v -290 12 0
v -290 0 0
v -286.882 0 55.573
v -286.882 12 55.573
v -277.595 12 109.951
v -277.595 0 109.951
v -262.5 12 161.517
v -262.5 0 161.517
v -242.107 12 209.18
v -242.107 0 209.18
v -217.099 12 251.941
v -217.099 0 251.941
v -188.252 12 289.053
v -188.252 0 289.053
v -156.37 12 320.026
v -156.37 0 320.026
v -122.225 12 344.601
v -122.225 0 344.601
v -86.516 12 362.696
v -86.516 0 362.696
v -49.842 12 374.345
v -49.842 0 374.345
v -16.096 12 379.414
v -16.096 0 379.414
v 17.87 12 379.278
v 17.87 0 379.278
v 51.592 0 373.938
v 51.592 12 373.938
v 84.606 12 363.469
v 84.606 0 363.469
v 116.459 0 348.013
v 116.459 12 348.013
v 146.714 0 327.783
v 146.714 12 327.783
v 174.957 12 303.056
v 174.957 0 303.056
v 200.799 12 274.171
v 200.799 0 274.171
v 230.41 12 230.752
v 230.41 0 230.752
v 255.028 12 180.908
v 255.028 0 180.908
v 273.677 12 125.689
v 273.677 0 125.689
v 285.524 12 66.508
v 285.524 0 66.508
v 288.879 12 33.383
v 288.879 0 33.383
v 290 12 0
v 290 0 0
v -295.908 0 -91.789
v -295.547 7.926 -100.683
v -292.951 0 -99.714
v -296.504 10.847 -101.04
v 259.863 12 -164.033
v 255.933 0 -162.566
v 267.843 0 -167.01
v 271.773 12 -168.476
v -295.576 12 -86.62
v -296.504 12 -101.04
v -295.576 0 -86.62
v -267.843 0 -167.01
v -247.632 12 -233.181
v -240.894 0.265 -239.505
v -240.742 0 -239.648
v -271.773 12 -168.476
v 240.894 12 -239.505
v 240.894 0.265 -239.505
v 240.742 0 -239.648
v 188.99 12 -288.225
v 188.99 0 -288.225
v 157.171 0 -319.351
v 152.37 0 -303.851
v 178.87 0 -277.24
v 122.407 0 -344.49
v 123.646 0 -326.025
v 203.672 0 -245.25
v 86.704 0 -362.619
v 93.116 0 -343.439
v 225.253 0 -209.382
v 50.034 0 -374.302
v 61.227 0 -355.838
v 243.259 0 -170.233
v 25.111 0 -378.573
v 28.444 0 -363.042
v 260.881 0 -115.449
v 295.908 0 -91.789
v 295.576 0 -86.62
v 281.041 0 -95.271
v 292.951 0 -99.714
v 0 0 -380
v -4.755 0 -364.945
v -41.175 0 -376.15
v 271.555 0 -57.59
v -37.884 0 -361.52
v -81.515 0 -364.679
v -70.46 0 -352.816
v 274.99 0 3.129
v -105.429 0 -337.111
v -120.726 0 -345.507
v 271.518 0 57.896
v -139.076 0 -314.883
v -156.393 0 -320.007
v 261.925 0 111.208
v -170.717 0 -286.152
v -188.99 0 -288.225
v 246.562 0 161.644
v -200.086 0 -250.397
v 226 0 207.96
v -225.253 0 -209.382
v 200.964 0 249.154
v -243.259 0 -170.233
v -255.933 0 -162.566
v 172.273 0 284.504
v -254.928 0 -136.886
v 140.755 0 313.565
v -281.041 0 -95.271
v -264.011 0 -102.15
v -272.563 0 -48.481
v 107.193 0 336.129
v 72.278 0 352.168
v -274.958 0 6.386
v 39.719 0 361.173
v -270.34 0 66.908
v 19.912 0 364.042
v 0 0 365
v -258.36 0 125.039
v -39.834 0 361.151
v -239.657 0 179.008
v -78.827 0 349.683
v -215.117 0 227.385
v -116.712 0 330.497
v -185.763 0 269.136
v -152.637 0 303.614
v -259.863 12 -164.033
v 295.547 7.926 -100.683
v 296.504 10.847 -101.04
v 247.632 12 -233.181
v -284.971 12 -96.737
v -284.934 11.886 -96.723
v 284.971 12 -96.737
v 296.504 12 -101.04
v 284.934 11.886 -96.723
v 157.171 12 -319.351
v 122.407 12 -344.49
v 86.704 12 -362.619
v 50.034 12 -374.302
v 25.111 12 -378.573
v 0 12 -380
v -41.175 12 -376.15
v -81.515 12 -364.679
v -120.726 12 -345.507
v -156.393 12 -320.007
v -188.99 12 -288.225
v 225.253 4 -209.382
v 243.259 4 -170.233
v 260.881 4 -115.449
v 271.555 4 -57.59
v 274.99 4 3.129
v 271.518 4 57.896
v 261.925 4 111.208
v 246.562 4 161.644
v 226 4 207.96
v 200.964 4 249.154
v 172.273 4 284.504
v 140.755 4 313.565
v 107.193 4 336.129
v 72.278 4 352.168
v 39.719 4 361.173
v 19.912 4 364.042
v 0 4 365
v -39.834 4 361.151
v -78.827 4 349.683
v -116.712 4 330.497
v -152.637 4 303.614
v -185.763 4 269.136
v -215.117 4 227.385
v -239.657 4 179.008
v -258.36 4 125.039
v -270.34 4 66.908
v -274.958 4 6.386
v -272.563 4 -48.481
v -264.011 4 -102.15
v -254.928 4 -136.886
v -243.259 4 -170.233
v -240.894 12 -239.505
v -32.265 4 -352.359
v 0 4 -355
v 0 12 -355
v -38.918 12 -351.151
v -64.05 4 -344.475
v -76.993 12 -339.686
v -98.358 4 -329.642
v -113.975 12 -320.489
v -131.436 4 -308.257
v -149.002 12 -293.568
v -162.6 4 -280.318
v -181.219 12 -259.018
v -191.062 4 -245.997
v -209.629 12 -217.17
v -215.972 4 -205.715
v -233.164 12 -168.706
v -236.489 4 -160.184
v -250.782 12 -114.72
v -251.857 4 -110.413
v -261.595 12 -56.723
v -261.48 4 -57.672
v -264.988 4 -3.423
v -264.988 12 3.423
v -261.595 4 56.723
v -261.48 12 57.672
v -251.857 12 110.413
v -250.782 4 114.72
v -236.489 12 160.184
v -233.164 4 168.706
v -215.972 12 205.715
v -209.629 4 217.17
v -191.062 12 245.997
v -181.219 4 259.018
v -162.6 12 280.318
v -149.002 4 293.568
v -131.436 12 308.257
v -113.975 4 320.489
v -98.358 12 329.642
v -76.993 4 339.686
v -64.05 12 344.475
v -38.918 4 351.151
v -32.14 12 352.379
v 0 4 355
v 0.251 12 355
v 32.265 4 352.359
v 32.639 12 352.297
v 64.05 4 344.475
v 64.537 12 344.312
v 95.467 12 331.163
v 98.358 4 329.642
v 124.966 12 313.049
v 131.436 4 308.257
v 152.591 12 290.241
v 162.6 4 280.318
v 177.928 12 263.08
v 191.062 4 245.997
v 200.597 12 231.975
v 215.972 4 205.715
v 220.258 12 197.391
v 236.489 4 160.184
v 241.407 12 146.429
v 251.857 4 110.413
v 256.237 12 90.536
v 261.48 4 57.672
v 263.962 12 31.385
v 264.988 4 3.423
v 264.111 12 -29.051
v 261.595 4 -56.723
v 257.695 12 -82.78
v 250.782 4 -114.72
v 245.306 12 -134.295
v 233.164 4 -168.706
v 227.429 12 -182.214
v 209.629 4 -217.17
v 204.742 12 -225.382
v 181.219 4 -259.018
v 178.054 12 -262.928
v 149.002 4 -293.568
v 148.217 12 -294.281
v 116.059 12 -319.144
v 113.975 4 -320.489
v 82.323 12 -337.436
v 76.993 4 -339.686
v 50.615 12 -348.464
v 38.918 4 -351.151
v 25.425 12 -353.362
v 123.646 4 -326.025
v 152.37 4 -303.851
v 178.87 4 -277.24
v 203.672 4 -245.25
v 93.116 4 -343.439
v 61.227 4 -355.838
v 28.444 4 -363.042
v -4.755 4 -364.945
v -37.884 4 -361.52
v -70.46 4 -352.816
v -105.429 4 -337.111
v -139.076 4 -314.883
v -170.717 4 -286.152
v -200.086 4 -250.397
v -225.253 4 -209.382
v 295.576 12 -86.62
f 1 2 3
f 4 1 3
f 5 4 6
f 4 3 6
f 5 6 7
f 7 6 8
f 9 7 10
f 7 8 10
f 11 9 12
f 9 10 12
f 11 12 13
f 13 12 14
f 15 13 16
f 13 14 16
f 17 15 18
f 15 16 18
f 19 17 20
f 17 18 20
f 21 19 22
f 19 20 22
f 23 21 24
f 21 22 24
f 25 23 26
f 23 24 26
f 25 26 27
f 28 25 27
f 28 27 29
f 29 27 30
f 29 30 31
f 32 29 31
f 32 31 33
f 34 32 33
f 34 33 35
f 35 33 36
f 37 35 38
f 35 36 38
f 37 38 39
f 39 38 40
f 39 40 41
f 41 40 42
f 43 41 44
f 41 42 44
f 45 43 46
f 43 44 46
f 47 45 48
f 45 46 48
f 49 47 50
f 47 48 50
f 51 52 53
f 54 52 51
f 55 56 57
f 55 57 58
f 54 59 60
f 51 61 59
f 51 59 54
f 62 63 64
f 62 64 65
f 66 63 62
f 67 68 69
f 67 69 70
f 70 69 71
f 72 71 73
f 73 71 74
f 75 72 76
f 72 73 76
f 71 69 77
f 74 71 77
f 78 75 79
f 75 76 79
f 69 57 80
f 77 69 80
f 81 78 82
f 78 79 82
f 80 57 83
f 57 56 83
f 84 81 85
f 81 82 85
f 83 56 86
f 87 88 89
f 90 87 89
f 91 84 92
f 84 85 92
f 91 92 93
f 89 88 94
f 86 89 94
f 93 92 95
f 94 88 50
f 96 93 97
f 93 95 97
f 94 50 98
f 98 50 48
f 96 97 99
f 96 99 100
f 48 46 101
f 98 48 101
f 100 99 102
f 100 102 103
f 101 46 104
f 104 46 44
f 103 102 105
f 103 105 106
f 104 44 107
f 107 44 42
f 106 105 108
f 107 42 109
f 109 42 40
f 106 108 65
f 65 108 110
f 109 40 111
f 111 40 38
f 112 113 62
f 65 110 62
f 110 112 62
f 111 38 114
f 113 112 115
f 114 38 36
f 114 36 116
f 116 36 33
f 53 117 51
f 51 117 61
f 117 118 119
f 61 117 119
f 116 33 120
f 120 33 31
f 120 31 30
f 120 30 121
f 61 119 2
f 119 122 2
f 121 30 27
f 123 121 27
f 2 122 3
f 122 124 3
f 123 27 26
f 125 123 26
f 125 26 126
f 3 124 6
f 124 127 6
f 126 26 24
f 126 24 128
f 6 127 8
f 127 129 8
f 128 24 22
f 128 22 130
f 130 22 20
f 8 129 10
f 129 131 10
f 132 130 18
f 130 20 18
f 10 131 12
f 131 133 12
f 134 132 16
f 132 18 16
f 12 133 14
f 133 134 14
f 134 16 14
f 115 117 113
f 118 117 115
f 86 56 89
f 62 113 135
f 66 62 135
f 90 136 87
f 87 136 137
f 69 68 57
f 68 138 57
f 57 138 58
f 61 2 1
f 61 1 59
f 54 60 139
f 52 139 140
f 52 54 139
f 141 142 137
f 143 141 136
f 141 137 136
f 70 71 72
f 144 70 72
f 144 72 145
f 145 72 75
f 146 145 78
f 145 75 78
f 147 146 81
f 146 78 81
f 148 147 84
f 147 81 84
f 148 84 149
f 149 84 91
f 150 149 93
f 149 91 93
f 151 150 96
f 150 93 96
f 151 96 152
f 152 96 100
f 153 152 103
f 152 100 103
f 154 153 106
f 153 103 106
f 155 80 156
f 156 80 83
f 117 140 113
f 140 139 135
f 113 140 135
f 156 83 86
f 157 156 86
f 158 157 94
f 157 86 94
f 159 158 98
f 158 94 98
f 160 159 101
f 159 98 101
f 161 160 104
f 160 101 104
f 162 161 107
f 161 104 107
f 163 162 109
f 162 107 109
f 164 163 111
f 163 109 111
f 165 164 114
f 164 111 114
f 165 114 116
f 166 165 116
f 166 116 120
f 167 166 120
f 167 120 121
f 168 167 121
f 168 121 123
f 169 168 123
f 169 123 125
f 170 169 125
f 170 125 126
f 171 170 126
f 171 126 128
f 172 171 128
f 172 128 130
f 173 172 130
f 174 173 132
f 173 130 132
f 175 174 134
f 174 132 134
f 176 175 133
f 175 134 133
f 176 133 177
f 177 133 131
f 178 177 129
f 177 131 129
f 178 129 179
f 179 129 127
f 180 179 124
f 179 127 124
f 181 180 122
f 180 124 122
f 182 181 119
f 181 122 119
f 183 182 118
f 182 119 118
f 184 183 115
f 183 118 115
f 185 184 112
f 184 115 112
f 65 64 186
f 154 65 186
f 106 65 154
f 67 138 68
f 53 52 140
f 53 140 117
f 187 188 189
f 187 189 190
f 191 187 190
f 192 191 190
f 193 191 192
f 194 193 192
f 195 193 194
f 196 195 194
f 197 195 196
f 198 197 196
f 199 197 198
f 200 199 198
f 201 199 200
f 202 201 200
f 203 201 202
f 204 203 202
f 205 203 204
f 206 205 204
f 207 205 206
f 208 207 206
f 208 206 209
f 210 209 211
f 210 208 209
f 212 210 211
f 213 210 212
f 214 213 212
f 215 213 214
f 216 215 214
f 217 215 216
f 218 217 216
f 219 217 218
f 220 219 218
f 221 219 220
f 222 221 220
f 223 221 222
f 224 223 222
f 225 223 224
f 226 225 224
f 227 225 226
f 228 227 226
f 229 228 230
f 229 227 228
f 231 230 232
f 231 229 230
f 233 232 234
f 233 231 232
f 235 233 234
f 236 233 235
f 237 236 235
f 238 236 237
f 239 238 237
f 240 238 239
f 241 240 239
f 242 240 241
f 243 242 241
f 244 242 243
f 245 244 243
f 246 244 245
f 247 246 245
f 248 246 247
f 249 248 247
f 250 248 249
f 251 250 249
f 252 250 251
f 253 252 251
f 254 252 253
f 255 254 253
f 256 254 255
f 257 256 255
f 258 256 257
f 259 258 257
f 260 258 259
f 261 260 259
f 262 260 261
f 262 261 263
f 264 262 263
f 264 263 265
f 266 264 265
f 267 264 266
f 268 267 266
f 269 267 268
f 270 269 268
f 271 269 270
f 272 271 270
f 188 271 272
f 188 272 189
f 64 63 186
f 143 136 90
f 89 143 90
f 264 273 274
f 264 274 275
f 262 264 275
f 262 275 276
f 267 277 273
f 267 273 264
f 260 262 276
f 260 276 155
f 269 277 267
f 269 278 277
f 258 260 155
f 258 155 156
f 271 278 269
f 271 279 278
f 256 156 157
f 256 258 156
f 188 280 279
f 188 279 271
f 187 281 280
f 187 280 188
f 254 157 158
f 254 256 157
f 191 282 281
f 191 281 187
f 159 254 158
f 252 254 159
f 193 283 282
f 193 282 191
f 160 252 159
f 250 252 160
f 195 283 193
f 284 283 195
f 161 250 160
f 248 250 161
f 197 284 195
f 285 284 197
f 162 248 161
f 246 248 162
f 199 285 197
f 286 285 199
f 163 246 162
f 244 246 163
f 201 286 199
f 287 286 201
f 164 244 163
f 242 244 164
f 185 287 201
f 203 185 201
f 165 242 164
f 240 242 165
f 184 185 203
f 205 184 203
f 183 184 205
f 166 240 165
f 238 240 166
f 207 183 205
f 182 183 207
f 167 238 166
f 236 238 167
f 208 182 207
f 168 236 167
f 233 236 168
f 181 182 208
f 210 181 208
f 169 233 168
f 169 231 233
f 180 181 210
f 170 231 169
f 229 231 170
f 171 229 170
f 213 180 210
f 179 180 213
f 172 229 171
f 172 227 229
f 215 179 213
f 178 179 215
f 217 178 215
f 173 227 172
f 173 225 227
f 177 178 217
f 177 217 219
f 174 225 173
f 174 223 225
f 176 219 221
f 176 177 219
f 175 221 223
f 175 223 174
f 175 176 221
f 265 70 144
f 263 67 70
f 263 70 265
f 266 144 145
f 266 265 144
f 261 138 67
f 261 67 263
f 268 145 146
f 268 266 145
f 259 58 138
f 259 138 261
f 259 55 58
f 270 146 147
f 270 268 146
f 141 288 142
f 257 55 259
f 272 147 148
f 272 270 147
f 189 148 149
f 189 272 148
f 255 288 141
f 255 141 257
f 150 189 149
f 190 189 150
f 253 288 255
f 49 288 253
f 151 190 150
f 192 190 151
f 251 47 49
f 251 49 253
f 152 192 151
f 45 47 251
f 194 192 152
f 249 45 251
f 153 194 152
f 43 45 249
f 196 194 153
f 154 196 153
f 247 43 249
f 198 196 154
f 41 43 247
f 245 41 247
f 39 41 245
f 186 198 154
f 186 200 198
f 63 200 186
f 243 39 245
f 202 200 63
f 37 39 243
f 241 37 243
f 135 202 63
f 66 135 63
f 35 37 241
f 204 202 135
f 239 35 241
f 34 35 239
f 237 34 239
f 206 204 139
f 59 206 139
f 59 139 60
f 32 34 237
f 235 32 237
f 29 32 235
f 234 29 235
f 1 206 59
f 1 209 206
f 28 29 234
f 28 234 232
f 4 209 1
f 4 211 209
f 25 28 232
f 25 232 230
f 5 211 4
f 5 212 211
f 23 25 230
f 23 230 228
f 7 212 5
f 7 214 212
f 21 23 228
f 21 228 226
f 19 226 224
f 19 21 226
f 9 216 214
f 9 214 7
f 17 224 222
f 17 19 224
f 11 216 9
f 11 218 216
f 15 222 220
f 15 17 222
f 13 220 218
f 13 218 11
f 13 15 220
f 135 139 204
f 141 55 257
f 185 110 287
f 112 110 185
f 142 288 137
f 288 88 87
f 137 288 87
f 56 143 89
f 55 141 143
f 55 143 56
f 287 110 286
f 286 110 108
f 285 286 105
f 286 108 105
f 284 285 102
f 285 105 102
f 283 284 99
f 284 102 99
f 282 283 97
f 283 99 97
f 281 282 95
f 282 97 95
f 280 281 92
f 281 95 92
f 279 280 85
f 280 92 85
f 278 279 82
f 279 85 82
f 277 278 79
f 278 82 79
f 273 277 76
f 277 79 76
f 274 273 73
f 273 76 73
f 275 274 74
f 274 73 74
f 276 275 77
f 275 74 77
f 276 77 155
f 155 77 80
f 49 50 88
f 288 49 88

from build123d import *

# Parameters (mm, degrees)
SKETCH1_RX          = 380
SKETCH1_RY          = 290
SKETCH1_RX_2        = 355
SKETCH1_RY_2        = 265
BOSS_EXTRUDE1_DEPTH = 12
SKETCH2_RX          = 365
SKETCH2_RY          = 275
SKETCH2_RX_2        = 355
SKETCH2_RY_2        = 265
CUT_EXTRUDE1_DEPTH  = 4
BOSS_EXTRUDE2_DEPTH = 12
SKETCH5_W           = 309.529934858
SKETCH5_H           = 171.672064711
CUT_EXTRUDE2_DEPTH  = 735.328268392
CUT_EXTRUDE3_DEPTH  = 12


with BuildPart() as part:
    # Sketch1 → Boss-Extrude1 (new body)
    with BuildSketch(Plane(origin=(0, 0, 0), x_dir=(1, 0, 0), z_dir=(0, 1, 0))):
        with Locations(Location((0, 0), (0, 0, 90))):
            Ellipse(SKETCH1_RX, SKETCH1_RY)
        with Locations(Location((0, 0), (0, 0, 90))):
            Ellipse(SKETCH1_RX_2, SKETCH1_RY_2, mode=Mode.SUBTRACT)
    extrude(amount=BOSS_EXTRUDE1_DEPTH)

    # Sketch2 → Cut-Extrude1 (cut)
    with BuildSketch(Plane.XZ):
        with Locations(Location((0, 0), (0, 0, 90))):
            Ellipse(SKETCH2_RX, SKETCH2_RY)
        with Locations(Location((0, 0), (0, 0, 90))):
            Ellipse(SKETCH2_RX_2, SKETCH2_RY_2, mode=Mode.SUBTRACT)
    extrude(amount=-CUT_EXTRUDE1_DEPTH, mode=Mode.SUBTRACT)

    # Sketch4 → Boss-Extrude2 (add)
    with BuildSketch(Plane.XZ):
        Polygon((-290, 0), (-295.575664035, -86.619712155), (-301.740501189, -182.392415904), (-247.632092978, -233.180788145), (-240.893988337, -239.505449654), (-188.989530622, -288.225103524), (-243.259040828, -170.232954756), (-265.307990562, -122.294380272), align=None)
    boss_extrude2 = extrude(amount=-BOSS_EXTRUDE2_DEPTH)

    # Sketch5 → Cut-Extrude2 (cut, through all)
    with BuildSketch(Plane(origin=(-258.254517009, -96.35508405, -96.35508405), x_dir=(-0.3091654315444503, -0.11535001008591941, 0.9439868172337536), z_dir=(-0.8844332774281072, -0.32998316455372234, -0.32998316455372073))):
        with Locations((-84.653103238, 107.13606779)):
            Rectangle(SKETCH5_W, SKETCH5_H)
    cut_extrude2 = extrude(amount=CUT_EXTRUDE2_DEPTH, mode=Mode.SUBTRACT)

    # Sketch6 → Cut-Extrude3 (cut)
    with BuildSketch(Plane(origin=(-258.254517009, -96.35508405, -96.35508405), x_dir=(-0.30916543154444925, -0.11535001008591984, 0.9439868172337539), z_dir=(-0.8844332774281067, -0.3299831645537244, -0.3299831645537199))):
        with BuildLine():
            Line((-30.865090601, 131.785635233), (-7.176006525, 131.785635233))
            Line((-7.176006525, 131.785635233), (-4.584710226, 110.738229001))
            Line((-4.584710226, 110.738229001), (-2.005409483, 89.788254836))
            Line((-2.005409483, 89.788254836), (-73.29386872, 81.011424164))
            Line((-73.29386872, 81.011424164), (-76.400552283, 106.2449843))
            Line((-76.400552283, 106.2449843), (-144.944507271, 97.806049122))
            add(Edge.make_bspline(
                [(-537.868612965, -60.223865358), (-492.157096842, -6.578435532), (-422.520855321, 81.045468469), (-274.386448657, 128.55879657), (-187.039723393, 138.660281321), (-144.944507271, 97.806049122)],
                knots=[0, 0, 0, 0, 0.468078311, 0.64359283, 0.981724341, 0.981724341, 0.981724341, 0.981724341], degree=3))
            Line((-537.868612965, -60.223865358), (-636.026891233, -171.208244591))
            Line((-636.026891233, -171.208244591), (-643.517533775, -164.583271058))
            Line((-643.517533775, -164.583271058), (-635.491845337, -155.508885638))
            Line((-635.491845337, -155.508885638), (-642.982487879, -148.883912105))
            Line((-642.982487879, -148.883912105), (-651.008176316, -157.958297525))
            Line((-651.008176316, -157.958297525), (-658.498818858, -151.333323992))
            Line((-658.498818858, -151.333323992), (-650.473130421, -142.258938572))
            Line((-650.473130421, -142.258938572), (-657.963772962, -135.633965039))
            Line((-657.963772962, -135.633965039), (-427.114007888, 125.380371448))
            Line((-427.114007888, 125.380371448), (-418.125236838, 117.430403208))
            Line((-418.125236838, 117.430403208), (-401.767798679, 135.925227607))
            add(Edge.make_bspline(
                [(-289.768696146, 168.495546224), (-325.11063488, 151.482260648), (-362.499532822, 139.204958191), (-401.767798679, 135.925227607)],
                knots=[0, 0, 0, 0, 0.423035684, 0.423035684, 0.423035684, 0.423035684], degree=3))
            add(Edge.make_bspline(
                [(-283.026620179, 171.833838116), (-285.270101084, 170.706212791), (-287.518074448, 169.593894352), (-289.768696146, 168.495546224)],
                knots=[0.946107155, 0.946107155, 0.946107155, 0.946107155, 1, 1, 1, 1], degree=3))
            add(Edge.make_bspline(
                [(-220.87164928, 228.025535118), (-245.021206388, 192.954919504), (-283.026620179, 171.833838116)],
                knots=[0, 0, 0, 1, 1, 1], degree=2))
            Line((-220.87164928, 228.025535118), (-173.670200877, 233.306306737))
            add(Edge.make_bspline(
                [(-54.469215847, 127.311075643), (-131.48926087, 121.012429268), (-173.670200877, 233.306306737)],
                knots=[0, 0, 0, 1, 1, 1], degree=2))
            add(Edge.make_bspline(
                [(-30.865090601, 131.785635233), (-37.780770855, 129.025742334), (-45.684682956, 127.408675758), (-54.469215847, 127.311075643)],
                knots=[0.075372824, 0.075372824, 0.075372824, 0.075372824, 0.22551618, 0.22551618, 0.22551618, 0.22551618], degree=3, weights=[1, 0.918163719, 0.848614613, 0.79135268]))
        make_face()
    cut_extrude3 = extrude(amount=-CUT_EXTRUDE3_DEPTH, mode=Mode.SUBTRACT)

    # Mirror1: Boss-Extrude2, Cut-Extrude2, Cut-Extrude3 across plane
    add(boss_extrude2.mirror(Plane(origin=(0, 0, 0), x_dir=(0, 0, 1), z_dir=(1, 0, 0))))
    add(cut_extrude2.mirror(Plane(origin=(0, 0, 0), x_dir=(0, 0, 1), z_dir=(1, 0, 0))), mode=Mode.SUBTRACT)
    add(cut_extrude3.mirror(Plane(origin=(0, 0, 0), x_dir=(0, 0, 1), z_dir=(1, 0, 0))), mode=Mode.SUBTRACT)


solid = part.part
